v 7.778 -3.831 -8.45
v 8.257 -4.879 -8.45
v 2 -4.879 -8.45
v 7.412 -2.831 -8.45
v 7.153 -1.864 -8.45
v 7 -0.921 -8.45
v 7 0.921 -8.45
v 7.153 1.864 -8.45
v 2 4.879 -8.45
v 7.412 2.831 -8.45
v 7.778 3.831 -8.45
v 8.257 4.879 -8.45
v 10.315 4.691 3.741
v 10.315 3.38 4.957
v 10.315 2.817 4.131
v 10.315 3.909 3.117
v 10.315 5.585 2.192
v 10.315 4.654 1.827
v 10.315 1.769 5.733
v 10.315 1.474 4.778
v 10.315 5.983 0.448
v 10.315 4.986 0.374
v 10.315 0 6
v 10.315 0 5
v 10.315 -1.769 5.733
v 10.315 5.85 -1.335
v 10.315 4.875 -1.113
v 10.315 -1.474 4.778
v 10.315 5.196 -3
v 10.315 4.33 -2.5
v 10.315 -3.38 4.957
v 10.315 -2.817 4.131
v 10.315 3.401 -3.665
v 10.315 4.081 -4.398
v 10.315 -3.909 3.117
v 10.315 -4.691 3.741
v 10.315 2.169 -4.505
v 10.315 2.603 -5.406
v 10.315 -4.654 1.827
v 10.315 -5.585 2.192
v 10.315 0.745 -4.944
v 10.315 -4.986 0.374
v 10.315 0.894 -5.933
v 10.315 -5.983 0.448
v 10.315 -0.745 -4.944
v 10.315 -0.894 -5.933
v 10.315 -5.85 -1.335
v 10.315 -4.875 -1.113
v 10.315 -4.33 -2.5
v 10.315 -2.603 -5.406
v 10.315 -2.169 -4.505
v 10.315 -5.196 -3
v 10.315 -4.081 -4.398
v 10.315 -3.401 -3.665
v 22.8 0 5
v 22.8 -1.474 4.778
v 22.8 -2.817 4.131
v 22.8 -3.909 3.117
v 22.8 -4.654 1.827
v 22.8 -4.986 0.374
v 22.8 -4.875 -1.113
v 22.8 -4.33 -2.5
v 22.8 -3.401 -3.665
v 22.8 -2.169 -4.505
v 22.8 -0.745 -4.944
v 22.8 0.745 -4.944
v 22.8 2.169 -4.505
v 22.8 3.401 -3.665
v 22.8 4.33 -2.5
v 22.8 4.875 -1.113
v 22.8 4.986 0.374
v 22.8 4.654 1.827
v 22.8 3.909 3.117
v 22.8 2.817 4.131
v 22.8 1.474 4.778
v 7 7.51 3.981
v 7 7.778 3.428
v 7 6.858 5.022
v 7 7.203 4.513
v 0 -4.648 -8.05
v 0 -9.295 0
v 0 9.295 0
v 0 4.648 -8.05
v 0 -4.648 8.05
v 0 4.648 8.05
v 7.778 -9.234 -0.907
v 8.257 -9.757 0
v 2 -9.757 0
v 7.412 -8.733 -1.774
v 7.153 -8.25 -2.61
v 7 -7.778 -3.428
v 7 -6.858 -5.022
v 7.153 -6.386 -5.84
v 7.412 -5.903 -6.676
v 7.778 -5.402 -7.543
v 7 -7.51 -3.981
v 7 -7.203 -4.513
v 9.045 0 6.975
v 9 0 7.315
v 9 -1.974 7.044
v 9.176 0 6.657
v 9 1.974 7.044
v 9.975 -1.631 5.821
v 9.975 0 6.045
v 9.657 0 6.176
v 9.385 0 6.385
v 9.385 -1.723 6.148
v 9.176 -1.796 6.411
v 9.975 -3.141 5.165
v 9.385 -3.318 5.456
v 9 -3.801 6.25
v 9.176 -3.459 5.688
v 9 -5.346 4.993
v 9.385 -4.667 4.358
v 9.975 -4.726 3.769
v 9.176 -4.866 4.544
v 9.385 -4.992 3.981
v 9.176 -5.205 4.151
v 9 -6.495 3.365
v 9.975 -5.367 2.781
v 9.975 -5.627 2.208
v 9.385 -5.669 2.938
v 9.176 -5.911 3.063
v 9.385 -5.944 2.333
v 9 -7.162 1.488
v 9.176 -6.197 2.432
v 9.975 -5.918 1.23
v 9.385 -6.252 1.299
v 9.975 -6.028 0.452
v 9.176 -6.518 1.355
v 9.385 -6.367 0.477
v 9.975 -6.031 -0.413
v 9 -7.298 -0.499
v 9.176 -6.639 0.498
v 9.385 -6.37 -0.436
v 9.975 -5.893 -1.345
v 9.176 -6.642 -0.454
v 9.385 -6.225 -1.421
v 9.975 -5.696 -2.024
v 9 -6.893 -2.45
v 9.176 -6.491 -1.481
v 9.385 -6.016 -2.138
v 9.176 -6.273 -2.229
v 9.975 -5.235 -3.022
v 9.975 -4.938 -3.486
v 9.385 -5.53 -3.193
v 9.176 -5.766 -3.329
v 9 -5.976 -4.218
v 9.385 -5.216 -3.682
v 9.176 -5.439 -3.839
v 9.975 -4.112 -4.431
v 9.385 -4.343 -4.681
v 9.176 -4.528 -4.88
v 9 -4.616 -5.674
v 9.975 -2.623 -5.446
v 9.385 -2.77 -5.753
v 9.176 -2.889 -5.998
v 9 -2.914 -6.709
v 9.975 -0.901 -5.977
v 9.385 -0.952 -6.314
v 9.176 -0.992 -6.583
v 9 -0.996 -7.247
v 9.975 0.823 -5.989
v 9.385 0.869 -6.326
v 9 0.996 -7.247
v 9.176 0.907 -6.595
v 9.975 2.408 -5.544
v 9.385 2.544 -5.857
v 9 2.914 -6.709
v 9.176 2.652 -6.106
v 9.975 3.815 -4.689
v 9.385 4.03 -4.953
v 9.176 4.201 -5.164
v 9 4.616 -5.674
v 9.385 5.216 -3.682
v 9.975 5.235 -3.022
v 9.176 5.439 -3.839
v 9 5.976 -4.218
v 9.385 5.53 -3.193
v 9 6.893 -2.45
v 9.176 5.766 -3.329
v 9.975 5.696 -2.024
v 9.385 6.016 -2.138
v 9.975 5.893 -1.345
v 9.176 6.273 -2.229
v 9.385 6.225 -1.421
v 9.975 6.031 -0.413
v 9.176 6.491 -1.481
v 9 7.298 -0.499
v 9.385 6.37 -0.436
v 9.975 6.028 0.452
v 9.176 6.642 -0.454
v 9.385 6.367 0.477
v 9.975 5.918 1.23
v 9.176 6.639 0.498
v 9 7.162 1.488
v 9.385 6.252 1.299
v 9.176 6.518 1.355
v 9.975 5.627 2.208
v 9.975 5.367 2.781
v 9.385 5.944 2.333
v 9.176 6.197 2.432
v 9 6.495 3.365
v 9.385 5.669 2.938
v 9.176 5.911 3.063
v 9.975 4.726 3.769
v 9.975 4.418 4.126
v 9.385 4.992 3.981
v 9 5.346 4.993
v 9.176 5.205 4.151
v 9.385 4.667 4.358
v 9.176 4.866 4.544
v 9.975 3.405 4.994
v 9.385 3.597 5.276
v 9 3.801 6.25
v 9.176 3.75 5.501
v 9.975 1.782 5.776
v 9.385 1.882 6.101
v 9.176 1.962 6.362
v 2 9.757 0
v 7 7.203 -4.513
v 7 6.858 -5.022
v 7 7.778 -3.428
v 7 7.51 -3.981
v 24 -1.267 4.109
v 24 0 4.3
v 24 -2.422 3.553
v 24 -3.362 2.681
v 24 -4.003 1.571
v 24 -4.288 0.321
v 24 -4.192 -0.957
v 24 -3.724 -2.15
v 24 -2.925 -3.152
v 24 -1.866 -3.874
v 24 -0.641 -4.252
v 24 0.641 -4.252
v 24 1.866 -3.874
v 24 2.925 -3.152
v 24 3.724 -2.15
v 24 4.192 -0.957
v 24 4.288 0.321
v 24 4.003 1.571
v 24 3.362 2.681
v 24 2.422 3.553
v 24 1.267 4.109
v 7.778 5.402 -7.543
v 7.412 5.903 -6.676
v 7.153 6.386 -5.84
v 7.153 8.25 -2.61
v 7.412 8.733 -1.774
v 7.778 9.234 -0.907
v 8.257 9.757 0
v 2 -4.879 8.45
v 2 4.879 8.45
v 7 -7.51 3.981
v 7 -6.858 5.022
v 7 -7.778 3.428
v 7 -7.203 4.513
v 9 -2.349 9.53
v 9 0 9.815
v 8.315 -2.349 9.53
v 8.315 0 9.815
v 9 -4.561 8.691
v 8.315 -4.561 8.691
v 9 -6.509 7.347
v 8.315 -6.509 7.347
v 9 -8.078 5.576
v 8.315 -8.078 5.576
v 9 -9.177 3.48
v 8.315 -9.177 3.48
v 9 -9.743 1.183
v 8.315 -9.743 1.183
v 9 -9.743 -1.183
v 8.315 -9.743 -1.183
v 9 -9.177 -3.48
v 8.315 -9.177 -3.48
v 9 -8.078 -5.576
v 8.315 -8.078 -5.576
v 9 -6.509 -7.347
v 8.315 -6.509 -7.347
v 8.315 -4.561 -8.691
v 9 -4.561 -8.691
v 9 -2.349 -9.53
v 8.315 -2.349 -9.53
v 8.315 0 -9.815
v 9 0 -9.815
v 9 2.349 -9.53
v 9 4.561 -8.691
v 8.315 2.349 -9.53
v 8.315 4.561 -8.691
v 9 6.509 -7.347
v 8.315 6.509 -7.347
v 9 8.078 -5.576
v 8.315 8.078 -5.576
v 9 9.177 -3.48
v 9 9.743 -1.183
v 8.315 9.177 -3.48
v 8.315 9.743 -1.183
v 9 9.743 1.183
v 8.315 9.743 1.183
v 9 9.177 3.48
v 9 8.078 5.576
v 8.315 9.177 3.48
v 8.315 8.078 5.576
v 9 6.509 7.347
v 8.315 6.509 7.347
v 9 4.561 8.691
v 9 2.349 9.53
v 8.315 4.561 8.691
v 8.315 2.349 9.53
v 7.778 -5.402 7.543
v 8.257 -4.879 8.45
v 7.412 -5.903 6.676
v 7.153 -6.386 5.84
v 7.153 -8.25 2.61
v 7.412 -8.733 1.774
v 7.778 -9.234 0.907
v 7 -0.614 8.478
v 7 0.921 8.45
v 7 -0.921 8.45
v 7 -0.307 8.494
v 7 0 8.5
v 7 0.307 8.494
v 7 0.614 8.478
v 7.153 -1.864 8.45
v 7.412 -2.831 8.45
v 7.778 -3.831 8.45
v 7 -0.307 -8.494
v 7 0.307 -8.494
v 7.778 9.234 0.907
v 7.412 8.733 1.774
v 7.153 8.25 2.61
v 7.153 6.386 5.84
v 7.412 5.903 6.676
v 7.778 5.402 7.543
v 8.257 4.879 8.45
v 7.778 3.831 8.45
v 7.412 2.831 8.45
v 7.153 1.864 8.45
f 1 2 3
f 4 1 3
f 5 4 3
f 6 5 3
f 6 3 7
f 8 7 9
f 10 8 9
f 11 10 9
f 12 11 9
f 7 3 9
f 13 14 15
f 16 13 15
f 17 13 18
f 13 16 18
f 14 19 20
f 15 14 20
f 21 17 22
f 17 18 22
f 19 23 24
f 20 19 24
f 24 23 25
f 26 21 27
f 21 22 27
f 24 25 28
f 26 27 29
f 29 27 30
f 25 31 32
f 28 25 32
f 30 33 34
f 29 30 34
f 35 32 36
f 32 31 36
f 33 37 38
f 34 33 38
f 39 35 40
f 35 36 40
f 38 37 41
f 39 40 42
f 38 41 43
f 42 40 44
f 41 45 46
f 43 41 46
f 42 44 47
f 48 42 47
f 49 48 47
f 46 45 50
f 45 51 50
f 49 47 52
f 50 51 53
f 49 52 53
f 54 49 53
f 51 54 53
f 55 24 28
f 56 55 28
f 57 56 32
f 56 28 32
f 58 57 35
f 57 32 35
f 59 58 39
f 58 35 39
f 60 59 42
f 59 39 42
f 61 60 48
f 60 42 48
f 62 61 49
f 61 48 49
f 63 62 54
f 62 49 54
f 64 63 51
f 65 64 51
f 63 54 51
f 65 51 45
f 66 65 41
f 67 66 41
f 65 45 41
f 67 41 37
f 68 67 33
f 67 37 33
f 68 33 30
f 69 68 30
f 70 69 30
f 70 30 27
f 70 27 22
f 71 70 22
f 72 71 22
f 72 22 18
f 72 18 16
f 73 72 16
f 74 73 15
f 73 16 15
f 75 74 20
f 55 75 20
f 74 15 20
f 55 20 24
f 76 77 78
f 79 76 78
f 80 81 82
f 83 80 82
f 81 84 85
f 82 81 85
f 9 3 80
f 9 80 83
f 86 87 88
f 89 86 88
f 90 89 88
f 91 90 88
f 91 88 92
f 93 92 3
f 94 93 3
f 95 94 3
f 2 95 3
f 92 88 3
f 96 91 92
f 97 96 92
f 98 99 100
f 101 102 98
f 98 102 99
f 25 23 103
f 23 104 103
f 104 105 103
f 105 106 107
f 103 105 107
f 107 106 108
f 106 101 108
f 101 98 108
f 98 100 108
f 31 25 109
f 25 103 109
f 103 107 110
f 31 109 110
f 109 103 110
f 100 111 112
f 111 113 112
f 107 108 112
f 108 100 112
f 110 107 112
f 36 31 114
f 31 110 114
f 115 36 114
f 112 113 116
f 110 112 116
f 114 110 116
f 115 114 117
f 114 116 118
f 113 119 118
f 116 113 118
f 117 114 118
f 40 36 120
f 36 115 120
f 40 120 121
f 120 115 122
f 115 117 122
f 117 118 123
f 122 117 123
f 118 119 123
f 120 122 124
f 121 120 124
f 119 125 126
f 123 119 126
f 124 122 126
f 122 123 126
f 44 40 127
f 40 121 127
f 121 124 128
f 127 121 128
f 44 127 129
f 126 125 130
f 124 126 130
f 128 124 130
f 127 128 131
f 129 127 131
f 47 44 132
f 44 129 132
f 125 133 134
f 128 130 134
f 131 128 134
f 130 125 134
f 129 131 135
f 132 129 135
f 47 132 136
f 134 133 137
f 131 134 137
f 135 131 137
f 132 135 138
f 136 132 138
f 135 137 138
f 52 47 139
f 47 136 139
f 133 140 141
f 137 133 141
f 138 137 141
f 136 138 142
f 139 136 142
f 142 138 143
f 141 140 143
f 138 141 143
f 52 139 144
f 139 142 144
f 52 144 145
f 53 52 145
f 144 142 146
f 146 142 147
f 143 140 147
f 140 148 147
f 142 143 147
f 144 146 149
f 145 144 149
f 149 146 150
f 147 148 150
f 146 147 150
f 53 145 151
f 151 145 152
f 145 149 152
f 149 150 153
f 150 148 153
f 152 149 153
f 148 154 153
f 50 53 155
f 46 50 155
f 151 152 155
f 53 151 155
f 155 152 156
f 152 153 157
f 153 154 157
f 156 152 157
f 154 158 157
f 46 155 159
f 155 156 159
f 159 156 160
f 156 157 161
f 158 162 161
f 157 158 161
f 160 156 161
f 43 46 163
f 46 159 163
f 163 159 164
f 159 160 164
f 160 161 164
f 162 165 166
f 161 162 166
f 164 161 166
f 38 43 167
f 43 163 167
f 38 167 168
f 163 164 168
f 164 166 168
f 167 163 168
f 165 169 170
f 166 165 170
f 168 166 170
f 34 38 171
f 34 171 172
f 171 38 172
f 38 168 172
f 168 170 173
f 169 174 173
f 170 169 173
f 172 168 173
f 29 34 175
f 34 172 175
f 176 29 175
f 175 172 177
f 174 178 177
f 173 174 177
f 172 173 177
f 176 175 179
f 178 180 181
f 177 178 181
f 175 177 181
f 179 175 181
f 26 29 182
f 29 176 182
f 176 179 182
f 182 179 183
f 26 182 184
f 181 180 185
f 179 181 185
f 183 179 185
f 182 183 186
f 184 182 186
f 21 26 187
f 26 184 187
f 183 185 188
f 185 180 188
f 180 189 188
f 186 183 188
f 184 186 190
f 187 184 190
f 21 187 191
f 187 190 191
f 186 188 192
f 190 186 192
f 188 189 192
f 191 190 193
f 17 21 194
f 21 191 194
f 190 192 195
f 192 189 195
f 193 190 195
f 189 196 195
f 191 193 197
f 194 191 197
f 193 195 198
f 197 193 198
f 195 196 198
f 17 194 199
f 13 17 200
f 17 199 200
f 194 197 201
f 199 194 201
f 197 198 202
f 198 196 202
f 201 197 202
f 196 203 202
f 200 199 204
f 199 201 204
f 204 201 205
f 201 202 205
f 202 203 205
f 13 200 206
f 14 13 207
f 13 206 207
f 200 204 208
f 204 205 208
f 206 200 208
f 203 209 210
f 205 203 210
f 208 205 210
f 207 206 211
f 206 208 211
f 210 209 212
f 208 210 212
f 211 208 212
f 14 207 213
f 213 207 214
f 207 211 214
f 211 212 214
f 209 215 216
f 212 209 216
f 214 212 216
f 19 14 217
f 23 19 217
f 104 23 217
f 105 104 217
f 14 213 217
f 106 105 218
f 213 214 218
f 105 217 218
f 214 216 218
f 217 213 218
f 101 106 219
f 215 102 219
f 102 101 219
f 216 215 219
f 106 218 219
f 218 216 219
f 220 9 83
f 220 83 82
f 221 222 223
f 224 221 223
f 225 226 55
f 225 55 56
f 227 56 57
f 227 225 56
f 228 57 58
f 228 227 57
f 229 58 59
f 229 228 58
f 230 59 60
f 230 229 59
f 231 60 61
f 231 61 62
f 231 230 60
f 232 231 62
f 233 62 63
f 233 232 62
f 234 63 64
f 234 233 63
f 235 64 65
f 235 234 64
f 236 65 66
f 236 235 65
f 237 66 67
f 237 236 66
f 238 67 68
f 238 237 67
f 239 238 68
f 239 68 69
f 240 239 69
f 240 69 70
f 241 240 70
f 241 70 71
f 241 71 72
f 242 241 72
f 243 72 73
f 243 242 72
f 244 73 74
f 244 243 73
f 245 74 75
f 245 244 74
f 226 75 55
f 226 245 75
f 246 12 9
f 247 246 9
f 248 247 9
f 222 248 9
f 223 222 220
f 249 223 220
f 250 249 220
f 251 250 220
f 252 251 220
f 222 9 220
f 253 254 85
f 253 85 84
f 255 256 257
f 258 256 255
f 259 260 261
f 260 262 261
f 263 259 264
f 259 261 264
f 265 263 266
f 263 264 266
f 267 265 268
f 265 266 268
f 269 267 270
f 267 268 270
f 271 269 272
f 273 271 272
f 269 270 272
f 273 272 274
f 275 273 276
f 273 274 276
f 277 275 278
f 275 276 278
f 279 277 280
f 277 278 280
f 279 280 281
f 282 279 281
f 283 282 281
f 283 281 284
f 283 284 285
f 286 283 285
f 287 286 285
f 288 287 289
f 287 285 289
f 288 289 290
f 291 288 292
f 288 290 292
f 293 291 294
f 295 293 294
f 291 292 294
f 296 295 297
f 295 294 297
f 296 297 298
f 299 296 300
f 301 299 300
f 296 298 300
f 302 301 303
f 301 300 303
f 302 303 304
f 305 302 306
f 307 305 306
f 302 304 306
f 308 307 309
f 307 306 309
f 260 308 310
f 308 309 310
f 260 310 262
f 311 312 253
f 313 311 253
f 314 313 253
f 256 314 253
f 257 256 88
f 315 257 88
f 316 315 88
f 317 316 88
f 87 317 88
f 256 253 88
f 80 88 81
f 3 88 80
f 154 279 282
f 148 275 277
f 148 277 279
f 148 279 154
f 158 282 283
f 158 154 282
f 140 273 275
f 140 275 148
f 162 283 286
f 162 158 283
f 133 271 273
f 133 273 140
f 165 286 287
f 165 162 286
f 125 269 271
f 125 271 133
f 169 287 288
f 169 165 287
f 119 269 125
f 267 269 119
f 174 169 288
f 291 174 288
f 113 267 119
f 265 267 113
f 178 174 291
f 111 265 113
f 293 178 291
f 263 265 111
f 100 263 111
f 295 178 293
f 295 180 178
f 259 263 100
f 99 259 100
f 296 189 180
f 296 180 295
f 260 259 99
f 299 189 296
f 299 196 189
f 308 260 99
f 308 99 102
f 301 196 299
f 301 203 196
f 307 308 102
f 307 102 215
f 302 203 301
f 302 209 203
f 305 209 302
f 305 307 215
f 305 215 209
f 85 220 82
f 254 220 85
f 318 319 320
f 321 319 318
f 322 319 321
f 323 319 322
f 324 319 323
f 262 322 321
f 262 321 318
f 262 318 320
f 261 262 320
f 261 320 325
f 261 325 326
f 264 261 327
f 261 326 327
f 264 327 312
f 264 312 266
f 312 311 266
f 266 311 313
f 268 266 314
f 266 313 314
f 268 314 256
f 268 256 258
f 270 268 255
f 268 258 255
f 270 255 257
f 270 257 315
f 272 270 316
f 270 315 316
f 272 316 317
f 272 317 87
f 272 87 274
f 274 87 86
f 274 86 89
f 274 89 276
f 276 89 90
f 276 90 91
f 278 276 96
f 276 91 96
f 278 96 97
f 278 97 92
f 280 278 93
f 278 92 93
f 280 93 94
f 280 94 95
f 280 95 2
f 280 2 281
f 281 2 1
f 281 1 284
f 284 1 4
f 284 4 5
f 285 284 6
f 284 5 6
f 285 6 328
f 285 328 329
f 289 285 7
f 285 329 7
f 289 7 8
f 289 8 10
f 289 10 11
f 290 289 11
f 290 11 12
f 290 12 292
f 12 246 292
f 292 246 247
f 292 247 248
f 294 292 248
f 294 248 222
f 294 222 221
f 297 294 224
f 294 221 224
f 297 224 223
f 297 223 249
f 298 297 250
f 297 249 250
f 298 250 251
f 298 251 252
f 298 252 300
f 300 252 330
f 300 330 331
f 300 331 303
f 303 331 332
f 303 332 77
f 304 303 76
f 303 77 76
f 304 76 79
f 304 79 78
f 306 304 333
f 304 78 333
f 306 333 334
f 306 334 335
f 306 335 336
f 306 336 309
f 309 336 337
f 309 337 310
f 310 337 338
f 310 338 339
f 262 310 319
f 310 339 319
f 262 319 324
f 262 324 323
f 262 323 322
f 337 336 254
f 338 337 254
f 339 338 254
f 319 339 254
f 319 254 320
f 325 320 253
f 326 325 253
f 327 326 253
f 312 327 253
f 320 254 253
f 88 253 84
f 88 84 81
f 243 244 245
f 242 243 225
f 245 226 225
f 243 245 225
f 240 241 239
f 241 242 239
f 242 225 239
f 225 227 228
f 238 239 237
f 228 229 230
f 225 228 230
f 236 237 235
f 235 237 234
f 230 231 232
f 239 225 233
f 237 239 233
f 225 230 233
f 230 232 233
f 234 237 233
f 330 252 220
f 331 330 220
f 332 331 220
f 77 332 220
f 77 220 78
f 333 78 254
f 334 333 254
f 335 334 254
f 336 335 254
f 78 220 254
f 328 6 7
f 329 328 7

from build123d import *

# Parameters (mm, degrees)
F1_DEPTH = 9
F4_SIZE2 = 2
F4_SIZE  = 0.4
F5_SIZE2 = 0.7
F5_SIZE  = 1.2


with BuildPart() as f1:
    # F0 (on Right) → F1 (new body)
    with BuildSketch(Plane.YZ):
        Polygon((4.8786097747, 8.45), (-4.8786097747, 8.45), (-9.7572195493, 0), (-4.8786097747, -8.45), (4.8786097747, -8.45), (9.7572195493, 0), align=None)
    extrude(amount=F1_DEPTH)

    # F2 (on Front) → F3 (revolve)
    with BuildSketch(Plane.XZ):
        with BuildLine():
            Line((9, 7.315), (9, 0))
            Line((9, 0), (24, 0))
            Line((24, 0), (24, 5))
            Line((24, 5), (10.315, 5))
            Line((10.315, 5), (10.315, 6))
            ThreePointArc((10.315, 6), (9.3851545827, 6.3851545827), (9, 7.315))
        make_face()
        Polygon((7, 8.5), (7, 0), (9, 0), (9, 7.315), (9, 9.815), (8.315, 9.815), align=None)
    revolve(axis=Axis((17.0378703874, 0, 0), (1, 0, 0)))

    # F4
    f4_edges = [f1.edges().sort_by_distance(p)[0] for p in [
        (0, 0, 8.45),
        (0, -7.317915, 4.225),
        (0, -7.317915, -4.225),
        (0, 0, -8.45),
        (0, 7.317915, -4.225),
        (0, 7.317915, 4.225),
    ]]
    f4_side = f1.faces().sort_by_distance((0, 0, 0))[0]
    chamfer(f4_edges, length=F4_SIZE, length2=F4_SIZE2, reference=f4_side)

    # F5
    f5_edges = [f1.edges().sort_by_distance(p)[0] for p in [
        (24, 0, -5),
    ]]
    f5_side = f1.faces().sort_by_distance((17.1575, 0, -5))[0]
    chamfer(f5_edges, length=F5_SIZE, length2=F5_SIZE2, reference=f5_side)


solid = f1.part
